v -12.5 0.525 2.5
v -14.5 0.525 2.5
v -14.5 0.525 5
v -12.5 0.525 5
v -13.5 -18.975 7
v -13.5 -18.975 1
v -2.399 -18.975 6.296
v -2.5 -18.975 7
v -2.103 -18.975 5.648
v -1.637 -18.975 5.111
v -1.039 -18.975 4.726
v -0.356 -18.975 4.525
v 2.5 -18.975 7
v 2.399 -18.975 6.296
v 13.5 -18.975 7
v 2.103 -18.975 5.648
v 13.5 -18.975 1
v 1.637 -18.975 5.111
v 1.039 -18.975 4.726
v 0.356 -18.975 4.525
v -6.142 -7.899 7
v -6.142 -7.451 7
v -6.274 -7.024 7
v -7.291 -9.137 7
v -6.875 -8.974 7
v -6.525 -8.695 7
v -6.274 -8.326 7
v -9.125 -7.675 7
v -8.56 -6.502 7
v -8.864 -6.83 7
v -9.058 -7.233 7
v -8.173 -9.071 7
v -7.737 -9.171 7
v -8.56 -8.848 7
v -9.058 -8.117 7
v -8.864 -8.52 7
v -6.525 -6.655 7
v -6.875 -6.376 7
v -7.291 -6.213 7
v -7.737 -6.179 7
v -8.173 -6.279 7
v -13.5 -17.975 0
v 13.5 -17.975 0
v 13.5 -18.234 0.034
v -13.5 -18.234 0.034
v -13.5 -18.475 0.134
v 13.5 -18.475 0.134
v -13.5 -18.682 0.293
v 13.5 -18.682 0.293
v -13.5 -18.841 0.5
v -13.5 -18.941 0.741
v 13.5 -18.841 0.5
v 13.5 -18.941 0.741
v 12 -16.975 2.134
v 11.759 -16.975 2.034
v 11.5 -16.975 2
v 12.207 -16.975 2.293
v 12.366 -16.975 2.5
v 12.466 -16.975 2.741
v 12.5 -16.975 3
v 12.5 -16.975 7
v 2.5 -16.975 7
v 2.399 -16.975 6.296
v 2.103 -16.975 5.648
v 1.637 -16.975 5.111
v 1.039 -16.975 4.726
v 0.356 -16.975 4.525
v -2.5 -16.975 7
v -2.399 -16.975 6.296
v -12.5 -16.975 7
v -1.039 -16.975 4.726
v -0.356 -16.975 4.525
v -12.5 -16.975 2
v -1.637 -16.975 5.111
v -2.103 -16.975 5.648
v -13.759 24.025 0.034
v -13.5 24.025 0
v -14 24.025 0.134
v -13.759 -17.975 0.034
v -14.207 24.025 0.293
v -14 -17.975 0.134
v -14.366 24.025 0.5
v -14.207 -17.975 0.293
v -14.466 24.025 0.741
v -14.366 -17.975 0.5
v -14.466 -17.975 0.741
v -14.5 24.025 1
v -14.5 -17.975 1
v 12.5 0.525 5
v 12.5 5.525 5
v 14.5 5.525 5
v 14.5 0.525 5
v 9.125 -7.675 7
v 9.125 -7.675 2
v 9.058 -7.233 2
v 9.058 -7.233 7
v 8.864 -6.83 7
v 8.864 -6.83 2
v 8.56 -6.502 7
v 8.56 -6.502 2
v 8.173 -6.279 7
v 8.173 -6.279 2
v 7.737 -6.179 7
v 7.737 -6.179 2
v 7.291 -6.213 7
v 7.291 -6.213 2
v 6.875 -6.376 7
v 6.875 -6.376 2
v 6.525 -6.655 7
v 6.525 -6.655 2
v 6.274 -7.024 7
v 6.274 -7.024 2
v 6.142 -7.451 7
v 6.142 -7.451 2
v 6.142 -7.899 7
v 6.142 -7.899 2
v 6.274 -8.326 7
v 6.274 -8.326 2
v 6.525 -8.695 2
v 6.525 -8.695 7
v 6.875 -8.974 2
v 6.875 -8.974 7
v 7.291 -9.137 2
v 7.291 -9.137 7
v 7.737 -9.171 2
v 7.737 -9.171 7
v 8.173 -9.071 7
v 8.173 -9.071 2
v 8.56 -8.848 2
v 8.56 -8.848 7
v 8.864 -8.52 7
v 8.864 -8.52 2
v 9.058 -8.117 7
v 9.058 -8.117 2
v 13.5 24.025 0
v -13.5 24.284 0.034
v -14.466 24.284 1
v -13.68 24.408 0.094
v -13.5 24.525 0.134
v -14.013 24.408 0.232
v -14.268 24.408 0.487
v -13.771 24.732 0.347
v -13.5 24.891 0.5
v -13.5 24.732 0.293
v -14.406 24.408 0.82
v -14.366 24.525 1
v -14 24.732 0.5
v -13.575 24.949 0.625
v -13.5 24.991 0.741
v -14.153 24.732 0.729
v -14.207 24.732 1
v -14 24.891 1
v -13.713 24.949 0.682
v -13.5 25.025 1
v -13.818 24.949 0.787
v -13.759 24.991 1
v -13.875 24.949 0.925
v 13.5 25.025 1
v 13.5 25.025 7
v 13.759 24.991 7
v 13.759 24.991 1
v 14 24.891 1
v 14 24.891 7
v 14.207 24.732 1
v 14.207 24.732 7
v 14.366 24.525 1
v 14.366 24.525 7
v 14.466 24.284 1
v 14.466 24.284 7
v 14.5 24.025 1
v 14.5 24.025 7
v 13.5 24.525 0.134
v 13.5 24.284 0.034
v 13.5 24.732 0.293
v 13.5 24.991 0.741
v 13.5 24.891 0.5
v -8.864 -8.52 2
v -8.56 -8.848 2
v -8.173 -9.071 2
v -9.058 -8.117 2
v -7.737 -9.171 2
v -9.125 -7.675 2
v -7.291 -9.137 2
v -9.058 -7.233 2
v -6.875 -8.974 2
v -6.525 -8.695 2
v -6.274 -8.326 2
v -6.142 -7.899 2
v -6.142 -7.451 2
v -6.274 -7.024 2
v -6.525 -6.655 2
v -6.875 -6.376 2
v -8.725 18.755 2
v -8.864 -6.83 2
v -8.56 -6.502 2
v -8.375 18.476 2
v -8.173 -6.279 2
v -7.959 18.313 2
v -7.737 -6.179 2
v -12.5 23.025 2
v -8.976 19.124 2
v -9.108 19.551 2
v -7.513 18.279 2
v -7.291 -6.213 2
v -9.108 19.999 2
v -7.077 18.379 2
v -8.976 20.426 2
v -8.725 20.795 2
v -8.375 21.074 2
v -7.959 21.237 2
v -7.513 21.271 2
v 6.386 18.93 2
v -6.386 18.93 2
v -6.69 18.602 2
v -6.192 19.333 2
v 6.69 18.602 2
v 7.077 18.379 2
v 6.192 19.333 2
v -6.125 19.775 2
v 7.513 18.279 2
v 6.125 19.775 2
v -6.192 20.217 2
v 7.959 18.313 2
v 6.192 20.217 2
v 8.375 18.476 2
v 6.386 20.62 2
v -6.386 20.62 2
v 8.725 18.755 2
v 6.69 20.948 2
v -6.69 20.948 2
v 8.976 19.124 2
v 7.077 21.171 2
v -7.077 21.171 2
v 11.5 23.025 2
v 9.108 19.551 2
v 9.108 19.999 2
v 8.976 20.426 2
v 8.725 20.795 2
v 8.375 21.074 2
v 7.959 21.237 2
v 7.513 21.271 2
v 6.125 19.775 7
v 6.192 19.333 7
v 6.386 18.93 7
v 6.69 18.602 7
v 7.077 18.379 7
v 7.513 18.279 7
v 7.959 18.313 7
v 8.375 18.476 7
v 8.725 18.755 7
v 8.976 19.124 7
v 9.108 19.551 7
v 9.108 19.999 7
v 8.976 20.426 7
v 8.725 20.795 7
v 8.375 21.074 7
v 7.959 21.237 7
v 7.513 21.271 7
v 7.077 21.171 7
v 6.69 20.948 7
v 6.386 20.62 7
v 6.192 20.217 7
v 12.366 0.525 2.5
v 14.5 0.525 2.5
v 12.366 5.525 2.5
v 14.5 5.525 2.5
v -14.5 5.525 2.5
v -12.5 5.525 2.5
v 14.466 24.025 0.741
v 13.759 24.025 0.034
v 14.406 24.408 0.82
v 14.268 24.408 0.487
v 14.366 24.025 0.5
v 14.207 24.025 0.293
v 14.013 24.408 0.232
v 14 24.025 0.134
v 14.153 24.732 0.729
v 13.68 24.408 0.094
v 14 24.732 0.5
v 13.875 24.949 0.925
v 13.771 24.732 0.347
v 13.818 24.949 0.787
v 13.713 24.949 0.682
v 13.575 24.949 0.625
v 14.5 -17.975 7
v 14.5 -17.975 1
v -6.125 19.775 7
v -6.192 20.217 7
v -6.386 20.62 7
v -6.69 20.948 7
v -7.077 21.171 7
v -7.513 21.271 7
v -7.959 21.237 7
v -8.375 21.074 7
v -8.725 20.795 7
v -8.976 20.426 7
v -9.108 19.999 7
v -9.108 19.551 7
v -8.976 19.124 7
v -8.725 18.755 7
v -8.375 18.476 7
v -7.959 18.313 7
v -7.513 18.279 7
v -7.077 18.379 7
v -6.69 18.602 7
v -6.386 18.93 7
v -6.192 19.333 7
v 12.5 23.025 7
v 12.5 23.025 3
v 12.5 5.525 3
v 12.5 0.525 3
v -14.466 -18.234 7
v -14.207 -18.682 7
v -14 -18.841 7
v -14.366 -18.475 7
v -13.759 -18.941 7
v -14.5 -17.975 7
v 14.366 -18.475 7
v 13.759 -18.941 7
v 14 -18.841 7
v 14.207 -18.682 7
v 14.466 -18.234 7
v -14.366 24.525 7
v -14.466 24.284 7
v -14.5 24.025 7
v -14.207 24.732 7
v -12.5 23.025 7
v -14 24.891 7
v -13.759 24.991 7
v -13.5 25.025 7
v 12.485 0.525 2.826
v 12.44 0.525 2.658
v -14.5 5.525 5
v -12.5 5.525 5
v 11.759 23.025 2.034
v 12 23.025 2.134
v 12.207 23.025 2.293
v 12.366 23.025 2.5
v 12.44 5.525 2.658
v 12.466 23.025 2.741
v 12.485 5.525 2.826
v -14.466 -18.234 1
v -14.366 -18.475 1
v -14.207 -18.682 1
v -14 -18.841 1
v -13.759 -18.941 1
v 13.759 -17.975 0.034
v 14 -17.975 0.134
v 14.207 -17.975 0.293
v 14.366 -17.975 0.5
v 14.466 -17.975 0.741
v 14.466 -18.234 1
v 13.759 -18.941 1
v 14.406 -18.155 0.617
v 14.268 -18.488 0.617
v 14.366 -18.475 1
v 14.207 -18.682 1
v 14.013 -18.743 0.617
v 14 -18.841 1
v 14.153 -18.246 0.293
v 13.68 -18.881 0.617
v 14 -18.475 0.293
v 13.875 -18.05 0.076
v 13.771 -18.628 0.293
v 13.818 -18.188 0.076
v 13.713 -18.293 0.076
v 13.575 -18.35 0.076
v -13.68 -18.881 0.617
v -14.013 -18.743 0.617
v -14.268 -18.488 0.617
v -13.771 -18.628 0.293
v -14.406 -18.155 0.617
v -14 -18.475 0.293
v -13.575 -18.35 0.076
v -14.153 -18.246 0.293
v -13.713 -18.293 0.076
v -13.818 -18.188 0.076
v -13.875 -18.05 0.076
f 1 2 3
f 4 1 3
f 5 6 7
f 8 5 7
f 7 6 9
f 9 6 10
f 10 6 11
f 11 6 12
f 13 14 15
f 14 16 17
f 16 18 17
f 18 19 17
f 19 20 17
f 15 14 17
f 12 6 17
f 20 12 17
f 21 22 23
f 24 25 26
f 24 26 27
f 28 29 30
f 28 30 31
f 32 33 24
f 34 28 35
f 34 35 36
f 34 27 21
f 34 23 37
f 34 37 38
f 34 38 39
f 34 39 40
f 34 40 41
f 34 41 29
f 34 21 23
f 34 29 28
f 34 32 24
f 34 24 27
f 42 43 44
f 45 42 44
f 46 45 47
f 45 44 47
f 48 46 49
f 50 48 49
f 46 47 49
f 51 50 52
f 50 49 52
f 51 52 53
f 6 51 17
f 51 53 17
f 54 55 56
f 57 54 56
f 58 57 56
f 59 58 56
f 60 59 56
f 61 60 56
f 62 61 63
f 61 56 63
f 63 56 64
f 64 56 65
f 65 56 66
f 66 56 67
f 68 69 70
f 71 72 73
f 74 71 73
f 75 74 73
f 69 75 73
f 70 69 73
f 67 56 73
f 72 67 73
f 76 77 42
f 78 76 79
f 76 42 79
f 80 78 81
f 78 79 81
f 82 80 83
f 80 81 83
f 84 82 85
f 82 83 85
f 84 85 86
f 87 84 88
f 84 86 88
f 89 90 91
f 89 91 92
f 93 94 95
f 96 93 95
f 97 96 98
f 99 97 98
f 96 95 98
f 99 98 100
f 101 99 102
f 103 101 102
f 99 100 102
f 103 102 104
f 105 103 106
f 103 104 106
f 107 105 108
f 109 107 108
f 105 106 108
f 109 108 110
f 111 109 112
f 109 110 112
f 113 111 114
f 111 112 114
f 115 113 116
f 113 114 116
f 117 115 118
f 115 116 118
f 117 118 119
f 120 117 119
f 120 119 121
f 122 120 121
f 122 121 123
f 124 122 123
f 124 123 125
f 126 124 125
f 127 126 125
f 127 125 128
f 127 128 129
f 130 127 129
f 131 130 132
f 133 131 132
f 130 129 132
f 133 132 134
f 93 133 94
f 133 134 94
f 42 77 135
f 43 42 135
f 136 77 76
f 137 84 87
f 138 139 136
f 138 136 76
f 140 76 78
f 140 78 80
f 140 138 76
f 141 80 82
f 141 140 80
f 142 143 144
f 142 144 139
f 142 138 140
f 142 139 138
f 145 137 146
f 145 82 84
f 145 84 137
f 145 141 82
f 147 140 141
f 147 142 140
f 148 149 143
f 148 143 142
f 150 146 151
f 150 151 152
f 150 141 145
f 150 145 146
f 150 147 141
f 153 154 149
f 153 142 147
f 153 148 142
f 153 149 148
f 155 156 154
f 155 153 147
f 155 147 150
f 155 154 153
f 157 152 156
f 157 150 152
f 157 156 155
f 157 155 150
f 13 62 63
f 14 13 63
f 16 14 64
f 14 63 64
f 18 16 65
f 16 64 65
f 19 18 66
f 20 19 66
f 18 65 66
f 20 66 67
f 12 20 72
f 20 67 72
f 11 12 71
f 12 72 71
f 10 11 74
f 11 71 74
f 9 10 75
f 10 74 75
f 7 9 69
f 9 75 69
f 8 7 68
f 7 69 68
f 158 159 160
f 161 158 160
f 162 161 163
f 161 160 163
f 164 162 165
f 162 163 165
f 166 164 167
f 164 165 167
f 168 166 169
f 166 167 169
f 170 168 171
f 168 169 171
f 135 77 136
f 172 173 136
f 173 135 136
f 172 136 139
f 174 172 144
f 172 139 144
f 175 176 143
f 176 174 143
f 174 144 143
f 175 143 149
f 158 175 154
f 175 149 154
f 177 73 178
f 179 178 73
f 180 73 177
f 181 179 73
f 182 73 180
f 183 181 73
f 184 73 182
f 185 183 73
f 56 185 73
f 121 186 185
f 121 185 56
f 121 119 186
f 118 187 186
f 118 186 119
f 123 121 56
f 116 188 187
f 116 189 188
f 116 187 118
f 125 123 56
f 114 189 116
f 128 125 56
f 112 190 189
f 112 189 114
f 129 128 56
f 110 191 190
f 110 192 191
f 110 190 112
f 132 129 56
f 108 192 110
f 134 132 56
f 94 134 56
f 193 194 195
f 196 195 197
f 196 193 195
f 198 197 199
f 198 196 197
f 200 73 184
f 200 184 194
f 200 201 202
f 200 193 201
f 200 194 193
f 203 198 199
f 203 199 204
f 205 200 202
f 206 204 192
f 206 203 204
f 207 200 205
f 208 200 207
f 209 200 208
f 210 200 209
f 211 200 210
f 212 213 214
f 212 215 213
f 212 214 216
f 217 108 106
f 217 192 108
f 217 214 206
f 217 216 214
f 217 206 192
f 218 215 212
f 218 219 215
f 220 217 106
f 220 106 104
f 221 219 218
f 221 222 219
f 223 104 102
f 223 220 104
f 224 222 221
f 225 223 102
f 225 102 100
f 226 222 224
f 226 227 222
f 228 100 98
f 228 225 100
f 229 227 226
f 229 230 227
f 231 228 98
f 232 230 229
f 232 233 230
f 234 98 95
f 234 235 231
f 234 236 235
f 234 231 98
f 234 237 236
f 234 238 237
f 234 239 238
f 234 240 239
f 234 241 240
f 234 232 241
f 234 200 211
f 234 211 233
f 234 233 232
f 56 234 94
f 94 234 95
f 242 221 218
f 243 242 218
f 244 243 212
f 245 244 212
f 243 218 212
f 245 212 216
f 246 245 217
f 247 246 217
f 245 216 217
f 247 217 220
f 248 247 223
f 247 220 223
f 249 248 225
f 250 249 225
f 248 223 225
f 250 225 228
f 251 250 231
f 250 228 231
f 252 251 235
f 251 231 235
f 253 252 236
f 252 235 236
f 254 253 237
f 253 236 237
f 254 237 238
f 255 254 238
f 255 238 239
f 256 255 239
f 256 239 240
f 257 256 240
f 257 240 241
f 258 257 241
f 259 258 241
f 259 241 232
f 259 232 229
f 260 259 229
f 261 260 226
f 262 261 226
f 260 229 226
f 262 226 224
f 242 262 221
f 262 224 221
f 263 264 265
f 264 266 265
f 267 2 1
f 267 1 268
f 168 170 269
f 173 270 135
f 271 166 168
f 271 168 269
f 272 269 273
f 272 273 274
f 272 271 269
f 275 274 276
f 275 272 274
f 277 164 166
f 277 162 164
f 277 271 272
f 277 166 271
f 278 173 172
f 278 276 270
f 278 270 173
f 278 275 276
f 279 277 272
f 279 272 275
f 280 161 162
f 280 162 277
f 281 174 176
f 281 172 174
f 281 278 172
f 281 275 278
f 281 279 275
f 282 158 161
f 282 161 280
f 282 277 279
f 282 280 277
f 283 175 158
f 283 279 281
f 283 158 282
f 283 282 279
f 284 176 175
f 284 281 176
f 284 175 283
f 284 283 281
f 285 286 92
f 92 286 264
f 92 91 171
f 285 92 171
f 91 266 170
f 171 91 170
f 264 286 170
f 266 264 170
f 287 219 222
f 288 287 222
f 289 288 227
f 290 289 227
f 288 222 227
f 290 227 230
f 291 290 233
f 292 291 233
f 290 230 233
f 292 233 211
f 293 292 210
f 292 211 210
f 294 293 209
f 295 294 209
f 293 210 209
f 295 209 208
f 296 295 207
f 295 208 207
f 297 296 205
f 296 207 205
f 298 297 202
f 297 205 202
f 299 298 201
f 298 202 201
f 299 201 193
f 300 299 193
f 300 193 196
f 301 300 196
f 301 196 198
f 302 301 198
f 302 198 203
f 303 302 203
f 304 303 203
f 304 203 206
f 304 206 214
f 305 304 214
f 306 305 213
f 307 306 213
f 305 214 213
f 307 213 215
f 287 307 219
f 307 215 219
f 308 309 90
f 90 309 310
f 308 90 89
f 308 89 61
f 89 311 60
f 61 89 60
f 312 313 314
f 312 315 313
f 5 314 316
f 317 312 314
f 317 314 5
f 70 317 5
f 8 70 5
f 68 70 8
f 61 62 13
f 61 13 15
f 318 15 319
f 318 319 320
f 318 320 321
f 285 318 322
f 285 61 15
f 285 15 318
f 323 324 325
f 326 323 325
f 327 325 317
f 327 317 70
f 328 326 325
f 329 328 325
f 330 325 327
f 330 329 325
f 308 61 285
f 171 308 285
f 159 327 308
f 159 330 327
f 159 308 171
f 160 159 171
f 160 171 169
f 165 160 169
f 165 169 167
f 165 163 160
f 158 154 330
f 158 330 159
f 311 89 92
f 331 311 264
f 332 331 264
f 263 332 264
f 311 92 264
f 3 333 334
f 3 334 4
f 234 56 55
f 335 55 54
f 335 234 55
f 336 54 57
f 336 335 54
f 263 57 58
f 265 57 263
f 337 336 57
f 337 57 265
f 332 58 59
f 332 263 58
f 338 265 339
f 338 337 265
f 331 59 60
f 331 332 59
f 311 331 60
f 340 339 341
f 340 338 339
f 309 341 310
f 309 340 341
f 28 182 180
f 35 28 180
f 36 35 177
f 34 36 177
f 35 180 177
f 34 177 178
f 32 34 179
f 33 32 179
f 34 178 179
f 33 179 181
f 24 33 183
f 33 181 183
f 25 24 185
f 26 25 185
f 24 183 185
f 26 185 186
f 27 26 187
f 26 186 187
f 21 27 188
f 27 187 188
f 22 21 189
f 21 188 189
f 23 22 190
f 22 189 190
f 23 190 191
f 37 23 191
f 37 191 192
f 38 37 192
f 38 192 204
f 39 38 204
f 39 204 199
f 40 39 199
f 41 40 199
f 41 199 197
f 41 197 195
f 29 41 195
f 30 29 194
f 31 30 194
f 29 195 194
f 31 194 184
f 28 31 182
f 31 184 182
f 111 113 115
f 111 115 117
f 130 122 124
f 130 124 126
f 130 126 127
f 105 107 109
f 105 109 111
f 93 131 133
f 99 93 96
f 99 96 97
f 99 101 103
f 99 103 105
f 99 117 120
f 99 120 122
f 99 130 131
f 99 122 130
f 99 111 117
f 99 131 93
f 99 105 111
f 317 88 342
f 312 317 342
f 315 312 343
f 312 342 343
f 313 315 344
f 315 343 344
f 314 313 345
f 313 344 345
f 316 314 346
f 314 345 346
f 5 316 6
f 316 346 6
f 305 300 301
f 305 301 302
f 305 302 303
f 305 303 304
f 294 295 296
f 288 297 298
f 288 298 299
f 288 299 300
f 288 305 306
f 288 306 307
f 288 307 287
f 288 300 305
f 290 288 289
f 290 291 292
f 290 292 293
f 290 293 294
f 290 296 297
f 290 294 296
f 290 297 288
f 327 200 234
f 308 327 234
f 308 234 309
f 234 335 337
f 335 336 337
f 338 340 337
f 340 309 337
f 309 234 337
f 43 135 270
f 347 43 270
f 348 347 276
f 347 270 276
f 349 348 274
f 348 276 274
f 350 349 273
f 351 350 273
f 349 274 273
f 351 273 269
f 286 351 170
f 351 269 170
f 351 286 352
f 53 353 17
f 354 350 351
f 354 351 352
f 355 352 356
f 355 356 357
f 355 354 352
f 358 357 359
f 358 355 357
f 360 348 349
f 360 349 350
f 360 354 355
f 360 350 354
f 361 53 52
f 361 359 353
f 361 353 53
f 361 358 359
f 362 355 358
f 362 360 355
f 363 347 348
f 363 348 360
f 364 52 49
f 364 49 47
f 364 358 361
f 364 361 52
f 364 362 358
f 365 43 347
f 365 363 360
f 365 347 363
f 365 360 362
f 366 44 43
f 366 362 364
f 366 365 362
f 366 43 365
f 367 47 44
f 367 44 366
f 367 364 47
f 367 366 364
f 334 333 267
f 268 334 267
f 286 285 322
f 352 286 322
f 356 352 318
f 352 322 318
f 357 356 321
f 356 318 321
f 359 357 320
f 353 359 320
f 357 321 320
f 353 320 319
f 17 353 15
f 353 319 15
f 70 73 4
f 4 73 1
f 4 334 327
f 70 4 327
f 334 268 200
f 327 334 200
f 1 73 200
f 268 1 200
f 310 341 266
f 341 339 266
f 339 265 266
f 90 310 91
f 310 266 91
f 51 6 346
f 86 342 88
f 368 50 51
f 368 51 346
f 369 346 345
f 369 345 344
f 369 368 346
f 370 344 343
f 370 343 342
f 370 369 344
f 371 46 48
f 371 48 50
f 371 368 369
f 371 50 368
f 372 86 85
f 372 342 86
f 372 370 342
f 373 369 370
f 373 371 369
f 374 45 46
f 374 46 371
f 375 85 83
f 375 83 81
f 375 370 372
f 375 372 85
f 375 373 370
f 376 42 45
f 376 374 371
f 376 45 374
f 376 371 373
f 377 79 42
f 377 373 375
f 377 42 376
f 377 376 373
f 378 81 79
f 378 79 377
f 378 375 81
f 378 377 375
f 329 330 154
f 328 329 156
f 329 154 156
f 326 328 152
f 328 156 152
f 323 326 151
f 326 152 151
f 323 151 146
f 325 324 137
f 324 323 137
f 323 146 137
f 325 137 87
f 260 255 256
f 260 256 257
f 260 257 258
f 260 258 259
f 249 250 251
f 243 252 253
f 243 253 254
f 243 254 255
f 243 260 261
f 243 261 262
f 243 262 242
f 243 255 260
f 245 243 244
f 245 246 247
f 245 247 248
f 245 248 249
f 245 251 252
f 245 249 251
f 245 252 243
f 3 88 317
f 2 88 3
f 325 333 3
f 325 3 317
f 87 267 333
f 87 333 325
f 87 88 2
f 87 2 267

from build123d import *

# Parameters (mm, degrees)
SKETCH1_W           = 29
SKETCH1_H           = 44
BOSS_EXTRUDE1_DEPTH = 2
SKETCH2_W           = 29
SKETCH2_H           = 44
BOSS_EXTRUDE2_DEPTH = 5
CUT_EXTRUDE1_DEPTH  = 45.980551353
CUT_EXTRUDE2_DEPTH  = 39.93906297
SKETCH8_R           = 1.5
BOSS_EXTRUDE3_DEPTH = 5
FILLET1_R           = 1


with BuildPart() as part:
    # Sketch1 → Boss-Extrude1 (new body)
    with BuildSketch(Plane.XY):
        with Locations((0, 3.025)):
            Rectangle(SKETCH1_W, SKETCH1_H)
    extrude(amount=BOSS_EXTRUDE1_DEPTH)

    # Sketch2 → Boss-Extrude2 (add)
    with BuildSketch(Plane.XY.offset(2)):
        with Locations((0, 3.025)):
            Rectangle(SKETCH2_W, SKETCH2_H)
        Polygon((12.5, 23.025), (12.5, 16.975), (12.5, -16.975), (-12.5, -16.975), (-12.5, 16.975), (-12.5, 23.025), align=None, mode=Mode.SUBTRACT)
    extrude(amount=BOSS_EXTRUDE2_DEPTH)

    # Sketch4 → Cut-Extrude1 (cut, through all)
    with BuildSketch(Plane(origin=(0, -16.975, 0), x_dir=(1, 0, 0), z_dir=(0, 1, 0))):
        with BuildLine():
            Line((-2.5, -7), (2.5, -7))
            ThreePointArc((2.5, -7), (0, -4.5), (-2.5, -7))
        make_face()
    extrude(amount=-CUT_EXTRUDE1_DEPTH, mode=Mode.SUBTRACT)

    # Sketch5 → Cut-Extrude2 (cut, through all)
    with BuildSketch(Plane.ZY.offset(14.5)):
        Polygon((5, 5.525), (5, 0.525), (4.5, 0.525), (2.5, 0.525), (2.5, 5.525), (4.5, 5.525), align=None)
    extrude(amount=-CUT_EXTRUDE2_DEPTH, mode=Mode.SUBTRACT)

    # Sketch8 → Boss-Extrude3 (add)
    with BuildSketch(Plane.XY.offset(2)):
        with Locations((-7.625, 19.775)):
            Circle(SKETCH8_R)
        with Locations(Location((-7.625, -7.675, 0), (0, 0, 180))):
            Circle(SKETCH8_R)
        with Locations((7.625, -7.675)):
            Circle(SKETCH8_R)
        with Locations(Location((7.625, 19.775, 0), (0, 0, 180))):
            Circle(SKETCH8_R)
    extrude(amount=BOSS_EXTRUDE3_DEPTH)

    # Fillet1
    # the kernel refuses this fillet: 1 mm, written as the material it adds along each edge
    with BuildSketch(Plane(origin=(12.5, 23.025, 2), x_dir=(0, 0, 1), z_dir=(0, -1, 0))) as fillet1_piece_1_section:
        with BuildLine():
            CenterArc((FILLET1_R, FILLET1_R), FILLET1_R, 180, 90)
            Line((0, FILLET1_R), (0, 0))
            Line((0, 0), (FILLET1_R, 0))
        make_face()
    fillet1_piece_1 = extrude(amount=42.5, mode=Mode.PRIVATE)
    fillet1_piece_1 = split(fillet1_piece_1, bisect_by=Plane(origin=(12.460315407, 5.525, 2.623263613), z_dir=(0, 1, 0)), keep=Keep.TOP, mode=Mode.PRIVATE)
    add(fillet1_piece_1)
    with BuildSketch(Plane(origin=(12.5, 25.525, 2), x_dir=(0, 0, 1), z_dir=(0, -1, 0))) as fillet1_piece_2_section:
        with BuildLine():
            CenterArc((FILLET1_R, FILLET1_R), FILLET1_R, 180, 90)
            Line((0, FILLET1_R), (0, 0))
            Line((0, 0), (FILLET1_R, 0))
        make_face()
    fillet1_piece_2 = extrude(amount=42.5, mode=Mode.PRIVATE)
    fillet1_piece_2 = split(fillet1_piece_2, bisect_by=Plane(origin=(12.255975151, 3.025, 2.5), z_dir=(0, 0, -1)), keep=Keep.TOP, mode=Mode.PRIVATE)
    fillet1_piece_2 = split(fillet1_piece_2, bisect_by=Plane(origin=(12.255975151, 5.525, 2.17839593), z_dir=(0, -1, 0)), keep=Keep.TOP, mode=Mode.PRIVATE)
    add(fillet1_piece_2)
    with BuildSketch(Plane(origin=(12.5, 25.525, 2), x_dir=(0, 0, 1), z_dir=(0, -1, 0))) as fillet1_piece_3_section:
        with BuildLine():
            CenterArc((FILLET1_R, FILLET1_R), FILLET1_R, 180, 90)
            Line((0, FILLET1_R), (0, 0))
            Line((0, 0), (FILLET1_R, 0))
        make_face()
    fillet1_piece_3 = extrude(amount=42.5, mode=Mode.PRIVATE)
    fillet1_piece_3 = split(fillet1_piece_3, bisect_by=Plane(origin=(12.460315407, 0.525, 2.623263613), z_dir=(0, -1, 0)), keep=Keep.TOP, mode=Mode.PRIVATE)
    add(fillet1_piece_3)
    # the kernel refuses this fillet: 1 mm, written as the material it takes off along each edge
    with BuildSketch(Plane(origin=(13.5, 24.025, 1), x_dir=(0, 0, -1), z_dir=(0, 1, 0))) as fillet1_2_piece_1_section:
        Polygon((0, 0), (FILLET1_R * 1.02, 0), (FILLET1_R * 1.02, -FILLET1_R * 1.02), (0, -FILLET1_R * 1.02), align=None)
    fillet1_2_piece_1 = extrude(amount=FILLET1_R * 1.02, mode=Mode.PRIVATE)
    fillet1_2_piece_1 = fillet1_2_piece_1 - Plane(origin=(13.5, 24.025, 1), x_dir=(-0.7071067811865475, 0, 0.7071067811865475), z_dir=(0, 1, 0)) * Sphere(FILLET1_R, mode=Mode.PRIVATE)
    add(fillet1_2_piece_1, mode=Mode.SUBTRACT)
    with BuildSketch(Plane(origin=(13.5, -17.975, 1), x_dir=(1, 0, 0), z_dir=(0, 0, -1))) as fillet1_2_piece_2_section:
        Polygon((0, 0), (FILLET1_R * 1.02, 0), (FILLET1_R * 1.02, FILLET1_R * 1.02), (0, FILLET1_R * 1.02), align=None)
    fillet1_2_piece_2 = extrude(amount=FILLET1_R * 1.02, mode=Mode.PRIVATE)
    fillet1_2_piece_2 = fillet1_2_piece_2 - Plane(origin=(13.5, -17.975, 1), x_dir=(-0.7071067811865476, 0.7071067811865475, 0), z_dir=(0, 0, -1)) * Sphere(FILLET1_R, mode=Mode.PRIVATE)
    add(fillet1_2_piece_2, mode=Mode.SUBTRACT)
    with BuildSketch(Plane(origin=(-13.5, -17.975, 1), x_dir=(0, -1, 0), z_dir=(0, 0, -1))) as fillet1_2_piece_3_section:
        Polygon((0, 0), (FILLET1_R * 1.02, 0), (FILLET1_R * 1.02, FILLET1_R * 1.02), (0, FILLET1_R * 1.02), align=None)
    fillet1_2_piece_3 = extrude(amount=FILLET1_R * 1.02, mode=Mode.PRIVATE)
    fillet1_2_piece_3 = fillet1_2_piece_3 - Plane(origin=(-13.5, -17.975, 1), x_dir=(0.7071067811865475, 0.7071067811865477, 0), z_dir=(0, 0, -1)) * Sphere(FILLET1_R, mode=Mode.PRIVATE)
    add(fillet1_2_piece_3, mode=Mode.SUBTRACT)
    with BuildSketch(Plane(origin=(-13.5, 24.025, 1), x_dir=(0, 0, -1), z_dir=(0, 1, 0))) as fillet1_2_piece_4_section:
        Polygon((0, 0), (FILLET1_R * 1.02, 0), (FILLET1_R * 1.02, FILLET1_R * 1.02), (0, FILLET1_R * 1.02), align=None)
    fillet1_2_piece_4 = extrude(amount=FILLET1_R * 1.02, mode=Mode.PRIVATE)
    fillet1_2_piece_4 = fillet1_2_piece_4 - Plane(origin=(-13.5, 24.025, 1), x_dir=(0.7071067811865475, 0, 0.7071067811865475), z_dir=(0, 1, 0)) * Sphere(FILLET1_R, mode=Mode.PRIVATE)
    add(fillet1_2_piece_4, mode=Mode.SUBTRACT)
    with BuildSketch(Plane(origin=(14.5, 24.025, 0), x_dir=(-1, 0, 0), z_dir=(0, -1, 0)), Plane(origin=(-14.5, -17.975, 0), x_dir=(1, 0, 0), z_dir=(0, 1, 0))) as fillet1_2_piece_5:
        with BuildLine():
            CenterArc((FILLET1_R, -FILLET1_R), FILLET1_R, 90, 90)
            Line((0, -FILLET1_R), (0, 0))
            Line((0, 0), (FILLET1_R, 0))
        make_face()
    extrude(amount=42, mode=Mode.SUBTRACT)
    with BuildSketch(Plane(origin=(13.5, -18.975, 0), x_dir=(0, 1, 0), z_dir=(-1, 0, 0))) as fillet1_2_piece_6:
        with BuildLine():
            CenterArc((FILLET1_R, -FILLET1_R), FILLET1_R, 90, 90)
            Line((0, -FILLET1_R), (0, 0))
            Line((0, 0), (FILLET1_R, 0))
        make_face()
    extrude(amount=27, mode=Mode.SUBTRACT)
    with BuildSketch(Plane(origin=(14.5, -18.975, 9.5), x_dir=(-1, 0, 0), z_dir=(0, 0, -1)), Plane(origin=(-14.5, -18.975, 1), x_dir=(1, 0, 0), z_dir=(0, 0, 1))) as fillet1_2_piece_7:
        with BuildLine():
            CenterArc((FILLET1_R, FILLET1_R), FILLET1_R, 180, 90)
            Line((0, FILLET1_R), (0, 0))
            Line((0, 0), (FILLET1_R, 0))
        make_face()
    extrude(amount=8.5, mode=Mode.SUBTRACT)
    with BuildSketch(Plane(origin=(-14.5, 25.025, 1), x_dir=(1, 0, 0), z_dir=(0, 0, 1)), Plane(origin=(14.5, 25.025, 9.5), x_dir=(-1, 0, 0), z_dir=(0, 0, -1))) as fillet1_2_piece_8:
        with BuildLine():
            CenterArc((FILLET1_R, -FILLET1_R), FILLET1_R, 90, 90)
            Line((0, -FILLET1_R), (0, 0))
            Line((0, 0), (FILLET1_R, 0))
        make_face()
    extrude(amount=8.5, mode=Mode.SUBTRACT)
    with BuildSketch(Plane(origin=(-13.5, 25.025, 0), x_dir=(0, 0, 1), z_dir=(1, 0, 0))) as fillet1_2_piece_9:
        with BuildLine():
            CenterArc((FILLET1_R, FILLET1_R), FILLET1_R, 180, 90)
            Line((0, FILLET1_R), (0, 0))
            Line((0, 0), (FILLET1_R, 0))
        make_face()
    extrude(amount=27, mode=Mode.SUBTRACT)


solid = part.part
